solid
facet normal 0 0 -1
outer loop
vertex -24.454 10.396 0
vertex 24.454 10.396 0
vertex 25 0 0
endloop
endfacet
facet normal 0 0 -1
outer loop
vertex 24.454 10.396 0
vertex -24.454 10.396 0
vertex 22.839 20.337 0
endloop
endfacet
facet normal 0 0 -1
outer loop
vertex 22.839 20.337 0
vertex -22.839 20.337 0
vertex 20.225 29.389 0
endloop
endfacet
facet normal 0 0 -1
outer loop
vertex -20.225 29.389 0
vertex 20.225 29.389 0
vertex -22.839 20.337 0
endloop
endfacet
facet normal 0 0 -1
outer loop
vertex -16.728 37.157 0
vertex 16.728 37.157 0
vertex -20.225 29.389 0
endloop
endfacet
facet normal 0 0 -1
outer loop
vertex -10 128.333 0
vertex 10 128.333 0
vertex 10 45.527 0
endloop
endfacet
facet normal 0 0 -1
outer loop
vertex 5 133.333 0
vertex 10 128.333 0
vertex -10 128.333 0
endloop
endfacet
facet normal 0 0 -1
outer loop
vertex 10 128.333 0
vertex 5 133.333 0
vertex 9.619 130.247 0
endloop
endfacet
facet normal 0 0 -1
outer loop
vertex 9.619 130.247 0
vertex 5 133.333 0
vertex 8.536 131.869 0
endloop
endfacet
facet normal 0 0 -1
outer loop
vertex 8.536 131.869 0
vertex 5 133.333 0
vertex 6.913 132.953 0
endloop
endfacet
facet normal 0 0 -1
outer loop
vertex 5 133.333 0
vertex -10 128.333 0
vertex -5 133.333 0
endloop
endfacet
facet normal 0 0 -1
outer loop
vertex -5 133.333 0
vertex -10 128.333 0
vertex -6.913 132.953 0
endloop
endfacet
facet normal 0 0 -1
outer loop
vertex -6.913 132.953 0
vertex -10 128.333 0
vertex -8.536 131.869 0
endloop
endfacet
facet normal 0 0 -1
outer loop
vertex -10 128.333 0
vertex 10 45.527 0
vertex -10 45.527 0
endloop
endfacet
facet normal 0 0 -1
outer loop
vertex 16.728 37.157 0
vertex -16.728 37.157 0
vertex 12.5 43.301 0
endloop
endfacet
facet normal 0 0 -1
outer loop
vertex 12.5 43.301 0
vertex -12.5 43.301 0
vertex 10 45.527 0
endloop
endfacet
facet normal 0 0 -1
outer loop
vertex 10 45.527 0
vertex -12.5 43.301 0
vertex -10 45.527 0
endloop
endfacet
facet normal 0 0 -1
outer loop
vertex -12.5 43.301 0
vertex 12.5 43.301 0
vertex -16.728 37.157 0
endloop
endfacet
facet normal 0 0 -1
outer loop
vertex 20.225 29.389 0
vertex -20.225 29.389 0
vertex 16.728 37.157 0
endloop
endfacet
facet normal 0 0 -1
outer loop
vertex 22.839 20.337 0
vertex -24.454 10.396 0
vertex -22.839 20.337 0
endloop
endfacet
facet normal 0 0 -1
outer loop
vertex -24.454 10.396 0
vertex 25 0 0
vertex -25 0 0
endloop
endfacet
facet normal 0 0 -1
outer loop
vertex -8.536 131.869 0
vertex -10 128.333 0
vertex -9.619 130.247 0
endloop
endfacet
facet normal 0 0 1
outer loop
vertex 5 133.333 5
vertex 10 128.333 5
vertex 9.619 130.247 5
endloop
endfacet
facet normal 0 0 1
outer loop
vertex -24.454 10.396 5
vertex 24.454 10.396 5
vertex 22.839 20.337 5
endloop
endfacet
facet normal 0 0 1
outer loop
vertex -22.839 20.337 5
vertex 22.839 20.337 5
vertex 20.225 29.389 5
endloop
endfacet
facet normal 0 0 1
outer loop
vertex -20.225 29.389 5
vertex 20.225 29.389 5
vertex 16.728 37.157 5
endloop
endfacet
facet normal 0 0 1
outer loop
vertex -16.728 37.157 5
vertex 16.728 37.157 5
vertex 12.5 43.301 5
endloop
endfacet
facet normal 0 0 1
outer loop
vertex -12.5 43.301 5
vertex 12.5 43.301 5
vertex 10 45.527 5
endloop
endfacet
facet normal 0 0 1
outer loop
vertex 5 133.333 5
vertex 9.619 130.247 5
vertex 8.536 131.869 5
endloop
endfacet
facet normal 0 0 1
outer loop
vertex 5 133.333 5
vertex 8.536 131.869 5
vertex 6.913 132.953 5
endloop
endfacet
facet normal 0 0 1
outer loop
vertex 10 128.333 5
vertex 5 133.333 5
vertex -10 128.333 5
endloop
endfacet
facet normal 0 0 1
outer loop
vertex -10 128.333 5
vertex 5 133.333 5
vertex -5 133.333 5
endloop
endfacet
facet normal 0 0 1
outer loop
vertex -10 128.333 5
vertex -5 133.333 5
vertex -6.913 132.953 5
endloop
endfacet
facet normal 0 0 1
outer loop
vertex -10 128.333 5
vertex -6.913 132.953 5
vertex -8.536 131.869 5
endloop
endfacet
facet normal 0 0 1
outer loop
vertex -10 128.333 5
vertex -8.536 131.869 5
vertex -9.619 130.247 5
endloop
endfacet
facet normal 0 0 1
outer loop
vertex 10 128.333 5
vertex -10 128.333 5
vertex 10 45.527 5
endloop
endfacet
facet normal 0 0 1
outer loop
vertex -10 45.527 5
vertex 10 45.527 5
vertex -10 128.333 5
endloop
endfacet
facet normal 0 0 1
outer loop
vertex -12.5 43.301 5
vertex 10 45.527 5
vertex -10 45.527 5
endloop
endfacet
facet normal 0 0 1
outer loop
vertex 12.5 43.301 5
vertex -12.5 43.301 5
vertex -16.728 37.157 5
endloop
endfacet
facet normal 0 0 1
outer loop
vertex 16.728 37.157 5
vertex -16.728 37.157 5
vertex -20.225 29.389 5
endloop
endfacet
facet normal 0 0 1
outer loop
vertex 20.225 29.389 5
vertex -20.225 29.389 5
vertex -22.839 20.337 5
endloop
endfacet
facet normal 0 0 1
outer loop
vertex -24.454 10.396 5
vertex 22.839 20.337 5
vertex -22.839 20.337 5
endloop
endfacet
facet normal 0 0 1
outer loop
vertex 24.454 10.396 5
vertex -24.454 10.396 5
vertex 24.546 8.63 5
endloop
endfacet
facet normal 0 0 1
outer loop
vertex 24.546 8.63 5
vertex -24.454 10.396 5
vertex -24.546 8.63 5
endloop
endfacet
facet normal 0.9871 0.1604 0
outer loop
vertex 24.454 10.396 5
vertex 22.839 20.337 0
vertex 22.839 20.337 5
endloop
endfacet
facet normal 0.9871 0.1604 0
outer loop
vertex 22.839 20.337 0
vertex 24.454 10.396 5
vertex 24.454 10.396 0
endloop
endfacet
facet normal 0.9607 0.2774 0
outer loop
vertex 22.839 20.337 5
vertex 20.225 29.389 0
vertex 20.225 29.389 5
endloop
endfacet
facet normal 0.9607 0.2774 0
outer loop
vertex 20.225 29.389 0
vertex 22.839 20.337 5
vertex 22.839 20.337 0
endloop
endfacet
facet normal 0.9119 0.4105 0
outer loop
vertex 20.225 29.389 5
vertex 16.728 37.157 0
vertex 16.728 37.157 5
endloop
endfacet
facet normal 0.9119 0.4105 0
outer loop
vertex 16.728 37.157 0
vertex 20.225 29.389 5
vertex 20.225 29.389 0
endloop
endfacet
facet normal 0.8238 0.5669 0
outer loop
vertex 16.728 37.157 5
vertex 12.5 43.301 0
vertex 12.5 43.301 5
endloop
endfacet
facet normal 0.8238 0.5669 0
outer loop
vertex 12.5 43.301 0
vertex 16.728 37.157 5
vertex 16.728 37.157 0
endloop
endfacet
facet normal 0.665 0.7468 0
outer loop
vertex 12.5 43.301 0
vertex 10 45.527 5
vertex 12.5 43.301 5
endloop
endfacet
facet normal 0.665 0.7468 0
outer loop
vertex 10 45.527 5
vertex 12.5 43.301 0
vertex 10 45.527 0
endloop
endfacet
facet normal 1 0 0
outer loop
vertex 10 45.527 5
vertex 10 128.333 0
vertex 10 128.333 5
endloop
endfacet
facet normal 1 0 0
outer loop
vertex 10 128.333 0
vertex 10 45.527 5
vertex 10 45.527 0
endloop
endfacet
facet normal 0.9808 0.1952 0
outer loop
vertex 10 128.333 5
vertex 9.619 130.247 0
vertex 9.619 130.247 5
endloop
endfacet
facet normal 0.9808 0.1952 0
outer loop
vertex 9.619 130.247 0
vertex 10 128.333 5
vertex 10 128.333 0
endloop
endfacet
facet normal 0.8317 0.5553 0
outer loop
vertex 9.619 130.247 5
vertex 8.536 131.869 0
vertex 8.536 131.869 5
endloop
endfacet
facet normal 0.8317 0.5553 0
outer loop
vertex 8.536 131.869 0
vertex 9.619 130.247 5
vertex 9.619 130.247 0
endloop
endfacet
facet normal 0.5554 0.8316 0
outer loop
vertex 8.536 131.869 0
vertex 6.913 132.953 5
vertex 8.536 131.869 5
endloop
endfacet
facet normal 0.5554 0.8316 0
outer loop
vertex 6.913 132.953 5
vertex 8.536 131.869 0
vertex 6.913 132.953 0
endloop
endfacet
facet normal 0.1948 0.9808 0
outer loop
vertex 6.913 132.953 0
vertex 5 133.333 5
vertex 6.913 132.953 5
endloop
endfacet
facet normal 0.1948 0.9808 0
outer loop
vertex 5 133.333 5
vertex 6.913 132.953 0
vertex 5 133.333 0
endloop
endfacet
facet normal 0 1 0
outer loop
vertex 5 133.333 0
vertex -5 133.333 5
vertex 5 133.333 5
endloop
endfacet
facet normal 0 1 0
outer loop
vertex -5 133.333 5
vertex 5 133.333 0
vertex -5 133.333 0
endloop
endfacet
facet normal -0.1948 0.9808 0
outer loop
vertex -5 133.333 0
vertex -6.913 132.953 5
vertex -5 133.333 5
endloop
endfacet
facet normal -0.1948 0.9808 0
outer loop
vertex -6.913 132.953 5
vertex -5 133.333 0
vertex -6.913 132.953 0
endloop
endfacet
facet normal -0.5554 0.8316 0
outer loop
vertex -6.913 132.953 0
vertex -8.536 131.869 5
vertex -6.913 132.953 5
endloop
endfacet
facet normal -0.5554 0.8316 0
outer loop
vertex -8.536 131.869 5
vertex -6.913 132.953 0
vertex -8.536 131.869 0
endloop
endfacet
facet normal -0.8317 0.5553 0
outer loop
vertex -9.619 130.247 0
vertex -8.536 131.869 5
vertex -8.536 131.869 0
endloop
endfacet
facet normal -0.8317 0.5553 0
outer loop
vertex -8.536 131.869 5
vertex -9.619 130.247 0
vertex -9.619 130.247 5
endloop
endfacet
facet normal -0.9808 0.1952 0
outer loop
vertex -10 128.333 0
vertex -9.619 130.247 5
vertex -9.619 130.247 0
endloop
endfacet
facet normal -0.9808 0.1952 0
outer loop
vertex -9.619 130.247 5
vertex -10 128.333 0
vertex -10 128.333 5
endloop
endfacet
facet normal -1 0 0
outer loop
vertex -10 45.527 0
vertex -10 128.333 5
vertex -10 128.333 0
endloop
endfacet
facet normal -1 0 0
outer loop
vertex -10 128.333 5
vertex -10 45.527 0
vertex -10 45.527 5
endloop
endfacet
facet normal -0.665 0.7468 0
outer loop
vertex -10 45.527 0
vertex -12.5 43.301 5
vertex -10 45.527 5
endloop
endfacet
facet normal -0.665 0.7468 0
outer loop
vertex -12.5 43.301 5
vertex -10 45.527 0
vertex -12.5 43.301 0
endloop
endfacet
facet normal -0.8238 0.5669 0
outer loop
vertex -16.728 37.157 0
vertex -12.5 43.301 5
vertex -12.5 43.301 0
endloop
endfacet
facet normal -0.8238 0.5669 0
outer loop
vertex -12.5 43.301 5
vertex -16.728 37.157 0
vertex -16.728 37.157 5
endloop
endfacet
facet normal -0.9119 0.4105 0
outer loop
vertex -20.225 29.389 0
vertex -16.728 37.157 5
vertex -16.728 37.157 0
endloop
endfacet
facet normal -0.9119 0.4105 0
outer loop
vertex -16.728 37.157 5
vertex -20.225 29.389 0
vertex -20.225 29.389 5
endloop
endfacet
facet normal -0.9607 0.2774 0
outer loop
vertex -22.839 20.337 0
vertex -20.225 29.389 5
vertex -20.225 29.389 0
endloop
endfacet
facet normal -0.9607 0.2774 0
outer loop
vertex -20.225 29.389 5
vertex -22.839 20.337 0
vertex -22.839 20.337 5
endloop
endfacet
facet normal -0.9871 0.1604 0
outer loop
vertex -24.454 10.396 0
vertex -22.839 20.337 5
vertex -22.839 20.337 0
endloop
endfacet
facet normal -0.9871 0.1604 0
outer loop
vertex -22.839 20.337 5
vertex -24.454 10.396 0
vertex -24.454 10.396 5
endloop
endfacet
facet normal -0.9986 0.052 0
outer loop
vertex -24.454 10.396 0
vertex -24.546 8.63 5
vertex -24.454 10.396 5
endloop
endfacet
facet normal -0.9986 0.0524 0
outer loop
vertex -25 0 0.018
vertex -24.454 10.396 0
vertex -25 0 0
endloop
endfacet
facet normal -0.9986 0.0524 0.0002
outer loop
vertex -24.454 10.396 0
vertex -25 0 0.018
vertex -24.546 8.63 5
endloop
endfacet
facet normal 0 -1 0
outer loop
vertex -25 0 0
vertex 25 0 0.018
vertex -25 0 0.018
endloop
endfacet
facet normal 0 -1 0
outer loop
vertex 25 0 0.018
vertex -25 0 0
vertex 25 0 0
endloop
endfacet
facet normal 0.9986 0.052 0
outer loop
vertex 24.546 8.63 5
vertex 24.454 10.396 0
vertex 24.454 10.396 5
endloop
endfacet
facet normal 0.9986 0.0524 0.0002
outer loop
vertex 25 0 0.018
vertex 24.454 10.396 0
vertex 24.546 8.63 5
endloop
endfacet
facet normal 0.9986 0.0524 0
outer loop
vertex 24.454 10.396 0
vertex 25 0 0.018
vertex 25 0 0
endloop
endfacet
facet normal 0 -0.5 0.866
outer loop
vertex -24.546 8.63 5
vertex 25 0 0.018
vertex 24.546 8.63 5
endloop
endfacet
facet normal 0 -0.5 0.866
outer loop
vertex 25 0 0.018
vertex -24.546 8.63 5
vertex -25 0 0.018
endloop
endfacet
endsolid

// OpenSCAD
// Scraper (for door ice)
// Started 2025-02-13

handle_len = 100.0;
handle_dia = 20.0;
blade_wid = 60.0;
blade_len = 50.0;
scraper_thick = 5.0;

module blade2D() {
    scale([1,2,1])
    difference() {
        circle(d=blade_len);
        translate([0,-blade_len/2])
        square([blade_len, blade_len], center=true);
    }
}

rounding = 5.0;
module handle2D() {
    offset(rounding) offset(-rounding)
    translate([0,handle_len/2+blade_len/1.5])
    square([handle_dia, handle_len], center=true);
}

module scraperBody3D() {
linear_extrude(scraper_thick) {
    handle2D();
    blade2D();
}
}


module finalScraper3D() {
    difference() {
        scraperBody3D();
        translate([0,0,scraper_thick/2.0+1.6])
        rotate([30,0,0])
        cube([blade_wid, scraper_thick*4, scraper_thick*sqrt(2.0)], center=true);
    }
}


finalScraper3D();
